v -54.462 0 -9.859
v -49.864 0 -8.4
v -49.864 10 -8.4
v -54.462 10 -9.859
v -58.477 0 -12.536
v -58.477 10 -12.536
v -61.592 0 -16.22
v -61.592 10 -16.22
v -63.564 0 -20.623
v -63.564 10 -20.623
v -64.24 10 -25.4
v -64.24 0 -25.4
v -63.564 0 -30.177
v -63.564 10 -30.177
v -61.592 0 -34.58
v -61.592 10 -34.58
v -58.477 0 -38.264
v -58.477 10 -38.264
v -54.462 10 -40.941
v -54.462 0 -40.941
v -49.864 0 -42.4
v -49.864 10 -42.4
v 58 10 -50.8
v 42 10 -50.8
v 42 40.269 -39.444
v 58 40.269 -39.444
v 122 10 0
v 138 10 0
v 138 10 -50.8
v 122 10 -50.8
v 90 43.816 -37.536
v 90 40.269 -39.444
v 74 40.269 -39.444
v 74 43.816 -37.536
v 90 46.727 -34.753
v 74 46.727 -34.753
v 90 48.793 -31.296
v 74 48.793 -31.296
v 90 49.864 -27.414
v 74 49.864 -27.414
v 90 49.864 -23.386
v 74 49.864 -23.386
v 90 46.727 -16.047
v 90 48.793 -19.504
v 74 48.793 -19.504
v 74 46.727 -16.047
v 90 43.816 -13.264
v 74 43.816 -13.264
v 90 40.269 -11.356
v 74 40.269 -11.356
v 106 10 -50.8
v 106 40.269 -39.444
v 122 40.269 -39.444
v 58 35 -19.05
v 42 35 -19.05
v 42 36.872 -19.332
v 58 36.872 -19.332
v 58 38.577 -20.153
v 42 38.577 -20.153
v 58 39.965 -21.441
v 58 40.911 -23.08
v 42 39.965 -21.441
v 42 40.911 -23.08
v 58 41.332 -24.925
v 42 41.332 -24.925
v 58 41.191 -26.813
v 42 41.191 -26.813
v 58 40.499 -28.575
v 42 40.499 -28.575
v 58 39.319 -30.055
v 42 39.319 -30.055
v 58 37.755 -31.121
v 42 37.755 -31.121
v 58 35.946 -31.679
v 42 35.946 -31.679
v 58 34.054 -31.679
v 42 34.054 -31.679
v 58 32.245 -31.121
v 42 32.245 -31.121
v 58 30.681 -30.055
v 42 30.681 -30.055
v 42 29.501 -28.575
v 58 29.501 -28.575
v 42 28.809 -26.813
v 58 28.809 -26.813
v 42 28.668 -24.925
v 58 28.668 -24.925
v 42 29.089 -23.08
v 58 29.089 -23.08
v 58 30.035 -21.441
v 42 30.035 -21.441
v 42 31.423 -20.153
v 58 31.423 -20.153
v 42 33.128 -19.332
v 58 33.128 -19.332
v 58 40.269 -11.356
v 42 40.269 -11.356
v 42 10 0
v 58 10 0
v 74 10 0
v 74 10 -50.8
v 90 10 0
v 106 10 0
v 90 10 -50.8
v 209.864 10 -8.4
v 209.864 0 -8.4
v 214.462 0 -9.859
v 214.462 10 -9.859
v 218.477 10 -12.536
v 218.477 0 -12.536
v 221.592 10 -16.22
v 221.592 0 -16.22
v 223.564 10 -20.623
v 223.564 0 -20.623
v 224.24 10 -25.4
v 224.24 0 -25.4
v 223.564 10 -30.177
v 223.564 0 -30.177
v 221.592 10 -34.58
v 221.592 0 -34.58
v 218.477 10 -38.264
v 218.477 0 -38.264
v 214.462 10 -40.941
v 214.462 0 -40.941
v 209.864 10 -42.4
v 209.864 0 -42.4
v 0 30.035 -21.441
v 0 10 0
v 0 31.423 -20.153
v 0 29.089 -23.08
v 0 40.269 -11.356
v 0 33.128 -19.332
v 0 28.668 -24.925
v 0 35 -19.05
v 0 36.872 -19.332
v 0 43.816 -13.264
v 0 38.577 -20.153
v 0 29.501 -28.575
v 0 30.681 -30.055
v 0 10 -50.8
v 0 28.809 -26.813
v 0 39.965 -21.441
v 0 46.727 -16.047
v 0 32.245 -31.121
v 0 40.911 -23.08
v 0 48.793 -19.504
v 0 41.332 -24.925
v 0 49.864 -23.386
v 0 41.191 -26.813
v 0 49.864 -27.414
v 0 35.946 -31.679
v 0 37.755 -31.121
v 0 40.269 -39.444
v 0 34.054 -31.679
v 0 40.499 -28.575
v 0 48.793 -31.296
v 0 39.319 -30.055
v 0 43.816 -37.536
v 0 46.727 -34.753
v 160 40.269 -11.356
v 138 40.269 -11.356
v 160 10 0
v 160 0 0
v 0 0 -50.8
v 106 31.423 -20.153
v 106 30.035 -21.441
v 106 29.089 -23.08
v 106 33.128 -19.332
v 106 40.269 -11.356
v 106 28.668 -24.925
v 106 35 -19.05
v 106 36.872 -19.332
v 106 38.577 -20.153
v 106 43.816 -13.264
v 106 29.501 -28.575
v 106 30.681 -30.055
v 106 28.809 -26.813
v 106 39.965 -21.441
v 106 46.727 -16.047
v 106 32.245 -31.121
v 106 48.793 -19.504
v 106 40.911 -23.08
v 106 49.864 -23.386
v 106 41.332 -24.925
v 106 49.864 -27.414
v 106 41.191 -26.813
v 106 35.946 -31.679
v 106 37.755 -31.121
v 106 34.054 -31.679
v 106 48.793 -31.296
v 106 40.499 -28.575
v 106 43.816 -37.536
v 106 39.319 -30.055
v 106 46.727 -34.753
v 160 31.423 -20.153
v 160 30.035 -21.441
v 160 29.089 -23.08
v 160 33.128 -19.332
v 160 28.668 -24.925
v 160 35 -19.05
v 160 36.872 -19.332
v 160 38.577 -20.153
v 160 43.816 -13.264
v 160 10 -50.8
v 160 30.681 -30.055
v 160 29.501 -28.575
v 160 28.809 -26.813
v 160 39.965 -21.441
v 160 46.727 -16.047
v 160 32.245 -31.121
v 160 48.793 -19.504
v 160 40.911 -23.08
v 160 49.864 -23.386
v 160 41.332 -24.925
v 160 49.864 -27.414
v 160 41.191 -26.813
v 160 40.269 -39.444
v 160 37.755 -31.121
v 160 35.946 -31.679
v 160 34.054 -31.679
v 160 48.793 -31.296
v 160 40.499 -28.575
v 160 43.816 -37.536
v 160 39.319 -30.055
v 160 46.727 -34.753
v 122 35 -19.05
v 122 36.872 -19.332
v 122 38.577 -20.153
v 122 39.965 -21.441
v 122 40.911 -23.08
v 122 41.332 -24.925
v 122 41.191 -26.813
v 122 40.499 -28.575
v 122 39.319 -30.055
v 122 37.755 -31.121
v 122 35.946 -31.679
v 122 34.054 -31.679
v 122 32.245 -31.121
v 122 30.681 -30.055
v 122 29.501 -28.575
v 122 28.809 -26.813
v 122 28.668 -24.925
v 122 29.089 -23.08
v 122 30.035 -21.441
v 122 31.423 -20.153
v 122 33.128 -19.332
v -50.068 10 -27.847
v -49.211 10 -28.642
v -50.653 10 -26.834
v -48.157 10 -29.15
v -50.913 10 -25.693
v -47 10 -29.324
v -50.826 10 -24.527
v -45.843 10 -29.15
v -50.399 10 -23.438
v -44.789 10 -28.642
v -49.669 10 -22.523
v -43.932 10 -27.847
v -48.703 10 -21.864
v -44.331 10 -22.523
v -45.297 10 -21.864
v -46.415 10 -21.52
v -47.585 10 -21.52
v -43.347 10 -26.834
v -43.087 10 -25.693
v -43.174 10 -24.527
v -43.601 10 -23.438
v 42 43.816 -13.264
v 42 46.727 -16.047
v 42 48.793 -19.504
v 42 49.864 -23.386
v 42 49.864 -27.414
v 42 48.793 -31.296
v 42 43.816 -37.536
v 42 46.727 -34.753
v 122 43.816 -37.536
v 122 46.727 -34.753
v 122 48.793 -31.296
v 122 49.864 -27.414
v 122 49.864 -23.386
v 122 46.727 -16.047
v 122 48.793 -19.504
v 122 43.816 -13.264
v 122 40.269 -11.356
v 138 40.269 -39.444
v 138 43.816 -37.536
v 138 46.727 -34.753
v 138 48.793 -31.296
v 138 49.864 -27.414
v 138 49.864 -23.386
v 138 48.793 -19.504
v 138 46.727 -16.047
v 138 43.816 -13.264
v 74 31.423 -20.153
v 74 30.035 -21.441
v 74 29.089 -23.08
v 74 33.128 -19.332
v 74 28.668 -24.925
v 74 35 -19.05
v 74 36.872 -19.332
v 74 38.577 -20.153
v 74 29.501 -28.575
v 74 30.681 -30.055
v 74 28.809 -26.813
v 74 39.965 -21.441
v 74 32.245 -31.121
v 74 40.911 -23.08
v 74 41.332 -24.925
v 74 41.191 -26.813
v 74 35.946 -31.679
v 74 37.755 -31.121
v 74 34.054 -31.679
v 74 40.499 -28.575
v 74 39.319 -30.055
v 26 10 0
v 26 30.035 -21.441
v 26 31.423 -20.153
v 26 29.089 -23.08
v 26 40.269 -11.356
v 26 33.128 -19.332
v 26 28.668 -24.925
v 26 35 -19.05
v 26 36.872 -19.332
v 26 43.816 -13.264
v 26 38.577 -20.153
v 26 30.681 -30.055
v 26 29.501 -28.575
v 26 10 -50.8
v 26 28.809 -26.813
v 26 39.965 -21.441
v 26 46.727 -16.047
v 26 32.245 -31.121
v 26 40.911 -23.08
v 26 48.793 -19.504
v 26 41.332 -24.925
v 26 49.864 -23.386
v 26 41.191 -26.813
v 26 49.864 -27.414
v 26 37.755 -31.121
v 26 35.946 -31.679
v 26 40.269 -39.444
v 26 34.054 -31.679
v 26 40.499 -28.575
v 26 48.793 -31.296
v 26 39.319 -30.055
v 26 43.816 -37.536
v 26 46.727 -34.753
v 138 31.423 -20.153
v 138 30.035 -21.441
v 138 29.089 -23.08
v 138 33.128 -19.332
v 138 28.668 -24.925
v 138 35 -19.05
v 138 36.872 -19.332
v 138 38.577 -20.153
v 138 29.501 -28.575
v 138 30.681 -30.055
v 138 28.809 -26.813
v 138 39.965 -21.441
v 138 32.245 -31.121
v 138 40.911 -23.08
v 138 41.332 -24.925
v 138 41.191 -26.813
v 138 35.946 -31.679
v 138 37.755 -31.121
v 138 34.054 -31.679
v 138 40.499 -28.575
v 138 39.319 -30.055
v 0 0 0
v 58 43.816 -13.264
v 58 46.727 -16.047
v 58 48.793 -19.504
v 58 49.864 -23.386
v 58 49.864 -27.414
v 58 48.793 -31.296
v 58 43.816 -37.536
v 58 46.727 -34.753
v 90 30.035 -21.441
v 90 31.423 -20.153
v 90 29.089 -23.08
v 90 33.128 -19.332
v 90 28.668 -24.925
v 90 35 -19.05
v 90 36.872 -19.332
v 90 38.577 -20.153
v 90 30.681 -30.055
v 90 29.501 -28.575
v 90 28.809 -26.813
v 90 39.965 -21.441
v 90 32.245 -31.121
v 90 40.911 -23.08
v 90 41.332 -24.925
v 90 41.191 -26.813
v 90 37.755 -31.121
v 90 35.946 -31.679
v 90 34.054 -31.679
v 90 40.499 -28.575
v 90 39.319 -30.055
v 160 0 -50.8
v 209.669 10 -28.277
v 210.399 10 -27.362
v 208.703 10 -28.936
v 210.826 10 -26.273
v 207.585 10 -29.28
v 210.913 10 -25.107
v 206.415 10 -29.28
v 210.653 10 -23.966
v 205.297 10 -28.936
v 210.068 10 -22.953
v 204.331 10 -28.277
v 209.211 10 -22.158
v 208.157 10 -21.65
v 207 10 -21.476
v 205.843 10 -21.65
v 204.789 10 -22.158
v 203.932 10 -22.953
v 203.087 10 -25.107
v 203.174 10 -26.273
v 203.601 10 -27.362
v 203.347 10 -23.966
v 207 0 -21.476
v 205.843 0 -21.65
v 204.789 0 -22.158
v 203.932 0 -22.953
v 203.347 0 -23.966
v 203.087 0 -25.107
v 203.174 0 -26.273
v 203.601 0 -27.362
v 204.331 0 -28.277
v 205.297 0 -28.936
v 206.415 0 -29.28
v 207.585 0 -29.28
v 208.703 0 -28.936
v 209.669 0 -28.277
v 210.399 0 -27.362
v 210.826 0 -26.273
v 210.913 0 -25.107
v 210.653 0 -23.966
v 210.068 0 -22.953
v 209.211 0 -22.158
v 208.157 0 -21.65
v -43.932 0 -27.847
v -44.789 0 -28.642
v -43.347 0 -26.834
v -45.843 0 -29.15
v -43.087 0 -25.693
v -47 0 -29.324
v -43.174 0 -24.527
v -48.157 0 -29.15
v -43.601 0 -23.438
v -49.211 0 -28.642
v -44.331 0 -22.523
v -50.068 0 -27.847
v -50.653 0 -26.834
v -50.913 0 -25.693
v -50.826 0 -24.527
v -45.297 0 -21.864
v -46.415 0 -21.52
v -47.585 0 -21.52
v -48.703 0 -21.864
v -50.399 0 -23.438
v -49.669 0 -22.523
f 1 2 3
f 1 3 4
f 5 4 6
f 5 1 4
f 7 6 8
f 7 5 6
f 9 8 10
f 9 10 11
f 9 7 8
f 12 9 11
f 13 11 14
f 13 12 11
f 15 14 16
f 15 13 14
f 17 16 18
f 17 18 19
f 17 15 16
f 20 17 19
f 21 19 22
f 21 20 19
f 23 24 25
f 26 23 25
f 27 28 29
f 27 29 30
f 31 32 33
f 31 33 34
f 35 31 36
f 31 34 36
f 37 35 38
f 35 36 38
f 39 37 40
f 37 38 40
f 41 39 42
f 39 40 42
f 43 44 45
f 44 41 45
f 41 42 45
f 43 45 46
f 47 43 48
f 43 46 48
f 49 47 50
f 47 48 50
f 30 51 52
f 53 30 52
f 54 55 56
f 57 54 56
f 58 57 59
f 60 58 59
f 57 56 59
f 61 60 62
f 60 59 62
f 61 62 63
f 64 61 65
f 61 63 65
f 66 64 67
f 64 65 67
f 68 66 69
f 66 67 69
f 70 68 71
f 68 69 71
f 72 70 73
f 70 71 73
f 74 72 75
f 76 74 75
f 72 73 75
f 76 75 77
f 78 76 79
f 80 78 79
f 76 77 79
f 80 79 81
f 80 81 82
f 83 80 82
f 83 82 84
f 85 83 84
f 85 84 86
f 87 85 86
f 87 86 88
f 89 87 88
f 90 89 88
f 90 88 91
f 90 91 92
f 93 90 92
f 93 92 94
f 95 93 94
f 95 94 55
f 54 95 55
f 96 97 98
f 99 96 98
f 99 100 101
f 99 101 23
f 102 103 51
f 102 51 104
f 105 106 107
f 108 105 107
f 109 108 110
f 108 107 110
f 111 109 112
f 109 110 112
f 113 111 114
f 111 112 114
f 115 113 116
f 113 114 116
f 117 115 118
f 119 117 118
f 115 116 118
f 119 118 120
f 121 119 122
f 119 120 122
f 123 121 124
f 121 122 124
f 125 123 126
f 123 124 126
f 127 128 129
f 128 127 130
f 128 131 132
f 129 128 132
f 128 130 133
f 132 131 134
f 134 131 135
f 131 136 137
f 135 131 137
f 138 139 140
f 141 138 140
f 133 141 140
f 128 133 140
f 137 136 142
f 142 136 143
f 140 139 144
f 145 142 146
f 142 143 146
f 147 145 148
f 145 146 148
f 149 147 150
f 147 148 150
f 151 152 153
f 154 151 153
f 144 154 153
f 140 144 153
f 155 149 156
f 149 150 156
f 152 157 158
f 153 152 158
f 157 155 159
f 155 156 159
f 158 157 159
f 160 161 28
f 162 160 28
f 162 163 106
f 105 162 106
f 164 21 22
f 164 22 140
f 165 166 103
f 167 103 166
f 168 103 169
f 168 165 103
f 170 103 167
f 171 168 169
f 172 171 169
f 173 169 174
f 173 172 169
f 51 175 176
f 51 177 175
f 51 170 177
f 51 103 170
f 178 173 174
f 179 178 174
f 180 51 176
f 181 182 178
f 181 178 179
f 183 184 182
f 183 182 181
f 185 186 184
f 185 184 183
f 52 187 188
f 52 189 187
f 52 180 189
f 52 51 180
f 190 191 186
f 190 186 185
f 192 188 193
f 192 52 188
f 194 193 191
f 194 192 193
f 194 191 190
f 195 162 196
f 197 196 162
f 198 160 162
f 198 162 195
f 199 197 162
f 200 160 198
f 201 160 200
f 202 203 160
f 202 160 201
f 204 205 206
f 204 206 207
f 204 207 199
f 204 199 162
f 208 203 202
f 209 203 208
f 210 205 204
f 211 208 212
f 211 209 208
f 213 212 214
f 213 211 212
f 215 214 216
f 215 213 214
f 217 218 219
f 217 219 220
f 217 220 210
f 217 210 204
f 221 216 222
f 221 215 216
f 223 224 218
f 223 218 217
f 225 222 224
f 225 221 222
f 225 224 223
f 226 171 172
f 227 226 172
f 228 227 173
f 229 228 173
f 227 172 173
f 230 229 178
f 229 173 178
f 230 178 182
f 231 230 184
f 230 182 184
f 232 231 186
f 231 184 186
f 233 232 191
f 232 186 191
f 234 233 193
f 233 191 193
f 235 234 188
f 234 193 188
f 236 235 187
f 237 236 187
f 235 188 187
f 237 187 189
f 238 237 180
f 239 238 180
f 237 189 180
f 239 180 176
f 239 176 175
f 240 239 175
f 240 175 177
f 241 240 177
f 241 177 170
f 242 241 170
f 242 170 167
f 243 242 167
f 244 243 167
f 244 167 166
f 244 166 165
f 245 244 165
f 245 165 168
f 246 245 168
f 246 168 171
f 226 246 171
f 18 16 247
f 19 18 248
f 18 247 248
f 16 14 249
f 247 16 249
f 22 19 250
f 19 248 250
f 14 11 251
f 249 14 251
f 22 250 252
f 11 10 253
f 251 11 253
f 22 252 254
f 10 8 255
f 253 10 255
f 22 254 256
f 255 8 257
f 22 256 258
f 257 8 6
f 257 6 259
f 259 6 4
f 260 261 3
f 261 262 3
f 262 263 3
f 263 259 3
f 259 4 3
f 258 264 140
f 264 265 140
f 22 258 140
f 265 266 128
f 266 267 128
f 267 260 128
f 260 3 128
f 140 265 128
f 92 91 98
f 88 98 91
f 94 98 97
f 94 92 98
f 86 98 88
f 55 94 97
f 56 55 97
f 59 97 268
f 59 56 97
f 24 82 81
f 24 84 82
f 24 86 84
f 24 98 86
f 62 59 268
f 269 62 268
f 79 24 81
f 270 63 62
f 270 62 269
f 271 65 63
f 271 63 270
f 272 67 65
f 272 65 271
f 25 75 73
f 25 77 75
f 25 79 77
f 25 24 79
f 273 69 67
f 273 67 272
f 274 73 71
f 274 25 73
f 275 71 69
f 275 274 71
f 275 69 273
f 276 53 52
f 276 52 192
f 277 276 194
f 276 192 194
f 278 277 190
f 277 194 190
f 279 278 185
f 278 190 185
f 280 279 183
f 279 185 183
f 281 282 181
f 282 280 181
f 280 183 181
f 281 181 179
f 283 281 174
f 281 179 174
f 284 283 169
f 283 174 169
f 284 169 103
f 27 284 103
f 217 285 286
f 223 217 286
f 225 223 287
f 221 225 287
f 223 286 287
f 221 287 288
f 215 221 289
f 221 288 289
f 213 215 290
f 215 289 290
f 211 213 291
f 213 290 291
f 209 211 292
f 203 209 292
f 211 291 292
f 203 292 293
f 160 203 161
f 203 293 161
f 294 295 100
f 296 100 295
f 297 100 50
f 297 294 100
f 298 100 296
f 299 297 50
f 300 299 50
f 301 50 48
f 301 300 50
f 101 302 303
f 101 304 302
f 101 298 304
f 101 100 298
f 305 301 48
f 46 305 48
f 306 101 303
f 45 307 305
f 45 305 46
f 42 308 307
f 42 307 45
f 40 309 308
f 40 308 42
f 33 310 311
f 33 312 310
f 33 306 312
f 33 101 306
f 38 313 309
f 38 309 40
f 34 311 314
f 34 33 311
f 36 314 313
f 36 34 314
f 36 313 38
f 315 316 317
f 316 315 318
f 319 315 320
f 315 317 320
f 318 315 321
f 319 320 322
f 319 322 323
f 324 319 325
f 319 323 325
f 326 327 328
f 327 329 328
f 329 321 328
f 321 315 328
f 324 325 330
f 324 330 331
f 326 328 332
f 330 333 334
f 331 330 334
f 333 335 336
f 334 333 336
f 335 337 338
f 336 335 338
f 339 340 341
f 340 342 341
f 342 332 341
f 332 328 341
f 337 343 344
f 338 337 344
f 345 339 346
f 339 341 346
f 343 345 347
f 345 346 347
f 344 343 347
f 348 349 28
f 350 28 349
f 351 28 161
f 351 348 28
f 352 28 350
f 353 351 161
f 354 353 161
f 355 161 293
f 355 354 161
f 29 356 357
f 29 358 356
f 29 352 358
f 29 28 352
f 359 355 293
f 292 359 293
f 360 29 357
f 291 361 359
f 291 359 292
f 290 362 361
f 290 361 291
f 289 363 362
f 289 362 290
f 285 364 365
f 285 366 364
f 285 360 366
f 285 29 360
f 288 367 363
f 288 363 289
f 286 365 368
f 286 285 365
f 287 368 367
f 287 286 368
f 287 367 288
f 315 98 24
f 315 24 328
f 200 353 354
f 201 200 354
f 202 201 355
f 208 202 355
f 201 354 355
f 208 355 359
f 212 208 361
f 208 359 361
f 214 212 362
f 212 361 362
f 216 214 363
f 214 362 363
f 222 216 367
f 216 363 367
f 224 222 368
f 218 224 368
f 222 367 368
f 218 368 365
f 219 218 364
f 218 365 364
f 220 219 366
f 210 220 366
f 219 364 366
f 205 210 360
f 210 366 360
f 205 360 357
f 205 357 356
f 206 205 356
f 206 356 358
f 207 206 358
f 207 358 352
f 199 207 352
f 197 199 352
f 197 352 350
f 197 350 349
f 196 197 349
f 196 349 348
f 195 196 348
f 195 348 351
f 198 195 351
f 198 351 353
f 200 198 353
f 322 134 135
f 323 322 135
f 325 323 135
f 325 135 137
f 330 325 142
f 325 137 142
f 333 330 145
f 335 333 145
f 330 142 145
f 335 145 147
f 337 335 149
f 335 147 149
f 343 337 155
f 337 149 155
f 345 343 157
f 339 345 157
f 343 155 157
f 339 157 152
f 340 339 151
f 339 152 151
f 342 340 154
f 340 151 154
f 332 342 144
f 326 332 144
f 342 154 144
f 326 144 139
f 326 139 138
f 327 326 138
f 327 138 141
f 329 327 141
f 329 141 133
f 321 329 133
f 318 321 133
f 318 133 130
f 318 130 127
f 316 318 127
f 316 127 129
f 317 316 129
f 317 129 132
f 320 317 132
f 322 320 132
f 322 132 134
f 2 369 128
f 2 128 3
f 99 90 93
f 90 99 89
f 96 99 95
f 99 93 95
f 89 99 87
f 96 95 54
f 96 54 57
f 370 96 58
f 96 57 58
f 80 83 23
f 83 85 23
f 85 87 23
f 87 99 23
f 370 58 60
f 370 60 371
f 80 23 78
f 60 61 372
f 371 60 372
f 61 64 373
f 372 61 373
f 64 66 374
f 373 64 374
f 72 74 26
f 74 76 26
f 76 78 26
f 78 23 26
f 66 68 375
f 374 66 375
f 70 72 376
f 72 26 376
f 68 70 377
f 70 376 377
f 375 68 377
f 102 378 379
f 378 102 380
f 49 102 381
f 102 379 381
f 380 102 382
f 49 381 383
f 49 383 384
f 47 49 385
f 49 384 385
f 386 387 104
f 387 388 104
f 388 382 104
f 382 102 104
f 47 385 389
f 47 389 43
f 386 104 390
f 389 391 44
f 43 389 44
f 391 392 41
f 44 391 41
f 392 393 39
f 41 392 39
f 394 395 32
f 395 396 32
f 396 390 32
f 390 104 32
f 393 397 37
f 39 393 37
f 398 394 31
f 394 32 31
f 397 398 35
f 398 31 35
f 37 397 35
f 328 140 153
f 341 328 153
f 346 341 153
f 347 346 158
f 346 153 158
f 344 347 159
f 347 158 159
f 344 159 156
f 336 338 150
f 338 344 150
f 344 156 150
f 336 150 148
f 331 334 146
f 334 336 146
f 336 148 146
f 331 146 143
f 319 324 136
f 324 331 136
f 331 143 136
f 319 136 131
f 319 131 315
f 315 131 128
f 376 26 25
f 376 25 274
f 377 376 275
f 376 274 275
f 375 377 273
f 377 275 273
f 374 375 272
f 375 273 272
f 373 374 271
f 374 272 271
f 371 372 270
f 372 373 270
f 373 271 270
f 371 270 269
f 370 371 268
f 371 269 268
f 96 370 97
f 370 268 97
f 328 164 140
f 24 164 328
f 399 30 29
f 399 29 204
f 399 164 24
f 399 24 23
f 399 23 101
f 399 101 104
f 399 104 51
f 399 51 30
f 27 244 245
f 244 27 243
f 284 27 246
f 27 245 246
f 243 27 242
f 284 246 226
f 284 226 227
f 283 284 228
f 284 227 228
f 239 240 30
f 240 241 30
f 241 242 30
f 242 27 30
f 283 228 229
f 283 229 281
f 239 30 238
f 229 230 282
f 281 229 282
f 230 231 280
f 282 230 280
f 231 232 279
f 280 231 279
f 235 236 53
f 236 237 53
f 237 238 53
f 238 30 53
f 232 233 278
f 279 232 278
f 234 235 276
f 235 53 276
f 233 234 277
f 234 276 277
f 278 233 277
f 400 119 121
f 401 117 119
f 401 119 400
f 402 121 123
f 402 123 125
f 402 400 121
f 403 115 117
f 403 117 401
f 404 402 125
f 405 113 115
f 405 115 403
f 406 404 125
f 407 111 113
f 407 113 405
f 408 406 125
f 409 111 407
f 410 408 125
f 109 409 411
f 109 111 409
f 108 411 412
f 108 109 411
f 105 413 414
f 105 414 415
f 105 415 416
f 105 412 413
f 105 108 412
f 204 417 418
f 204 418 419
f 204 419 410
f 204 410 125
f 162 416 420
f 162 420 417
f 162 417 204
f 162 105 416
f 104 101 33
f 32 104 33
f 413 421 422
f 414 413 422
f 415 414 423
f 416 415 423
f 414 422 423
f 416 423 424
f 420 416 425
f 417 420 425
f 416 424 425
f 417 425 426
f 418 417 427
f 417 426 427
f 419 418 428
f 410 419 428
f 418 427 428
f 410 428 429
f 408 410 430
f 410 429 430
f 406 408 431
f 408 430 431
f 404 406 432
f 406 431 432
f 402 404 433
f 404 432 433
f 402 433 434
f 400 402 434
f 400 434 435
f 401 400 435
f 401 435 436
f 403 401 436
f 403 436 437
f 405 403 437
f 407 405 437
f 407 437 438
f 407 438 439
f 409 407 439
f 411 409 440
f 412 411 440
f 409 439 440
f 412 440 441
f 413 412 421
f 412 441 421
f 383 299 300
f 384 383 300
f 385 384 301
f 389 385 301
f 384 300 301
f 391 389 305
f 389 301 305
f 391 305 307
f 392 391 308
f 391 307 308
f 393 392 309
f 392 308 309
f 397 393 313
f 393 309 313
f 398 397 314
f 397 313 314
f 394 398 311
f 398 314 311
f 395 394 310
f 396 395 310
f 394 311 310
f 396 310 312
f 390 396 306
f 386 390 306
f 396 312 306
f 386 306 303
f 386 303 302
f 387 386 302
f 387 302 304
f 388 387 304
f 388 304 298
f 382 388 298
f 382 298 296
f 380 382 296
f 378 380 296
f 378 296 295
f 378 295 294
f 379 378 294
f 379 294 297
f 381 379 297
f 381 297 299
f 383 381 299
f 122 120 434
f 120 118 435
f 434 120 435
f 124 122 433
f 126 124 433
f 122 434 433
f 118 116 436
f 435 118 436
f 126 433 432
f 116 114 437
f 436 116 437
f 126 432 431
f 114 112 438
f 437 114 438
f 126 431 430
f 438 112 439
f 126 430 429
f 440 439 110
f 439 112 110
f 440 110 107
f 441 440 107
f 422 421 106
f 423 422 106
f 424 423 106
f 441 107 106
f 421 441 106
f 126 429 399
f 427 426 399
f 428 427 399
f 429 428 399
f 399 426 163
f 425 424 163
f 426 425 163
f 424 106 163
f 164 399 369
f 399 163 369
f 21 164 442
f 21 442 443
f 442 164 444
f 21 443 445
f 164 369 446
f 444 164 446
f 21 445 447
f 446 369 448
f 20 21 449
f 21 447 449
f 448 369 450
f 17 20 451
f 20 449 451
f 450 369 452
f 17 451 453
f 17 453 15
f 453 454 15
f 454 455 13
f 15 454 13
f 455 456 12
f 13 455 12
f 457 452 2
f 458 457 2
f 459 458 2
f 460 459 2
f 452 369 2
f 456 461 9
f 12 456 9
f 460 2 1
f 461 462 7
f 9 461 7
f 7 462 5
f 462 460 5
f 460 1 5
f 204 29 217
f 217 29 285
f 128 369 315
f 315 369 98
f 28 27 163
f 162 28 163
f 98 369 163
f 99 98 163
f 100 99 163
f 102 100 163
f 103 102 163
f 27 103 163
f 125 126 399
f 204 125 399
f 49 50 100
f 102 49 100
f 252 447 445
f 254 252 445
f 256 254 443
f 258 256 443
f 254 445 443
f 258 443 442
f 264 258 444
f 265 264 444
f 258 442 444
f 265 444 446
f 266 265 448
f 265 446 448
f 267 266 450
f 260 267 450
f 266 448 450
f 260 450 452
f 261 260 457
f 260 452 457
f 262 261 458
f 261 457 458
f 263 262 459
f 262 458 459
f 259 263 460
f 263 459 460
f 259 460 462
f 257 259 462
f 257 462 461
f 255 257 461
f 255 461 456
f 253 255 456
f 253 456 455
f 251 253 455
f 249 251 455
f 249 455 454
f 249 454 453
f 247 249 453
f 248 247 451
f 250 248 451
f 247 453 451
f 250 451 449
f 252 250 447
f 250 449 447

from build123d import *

# Parameters (mm, degrees)
SKETCH1_W           = 160
SKETCH1_H           = 50.8
BOSS_EXTRUDE1_DEPTH = 10
SKETCH2_R           = 6.35
BOSS_EXTRUDE2_DEPTH = 160
SKETCH3_W           = 16
SKETCH3_H           = 40
CUT_EXTRUDE1_DEPTH  = 71
SKETCH5_R           = 3.9243
BOSS_EXTRUDE3_DEPTH = 10


with BuildPart() as part:
    # Sketch1 → Boss-Extrude1 (new body)
    with BuildSketch(Plane(origin=(0, 0, 0), x_dir=(1, 0, 0), z_dir=(0, 1, 0))):
        with Locations((80, 25.4)):
            Rectangle(SKETCH1_W, SKETCH1_H)
    extrude(amount=BOSS_EXTRUDE1_DEPTH)

    # Sketch2 → Boss-Extrude2 (add, through all)
    with BuildSketch(Plane.ZY):
        with BuildLine():
            Line((-50.8, 10), (-39.444175854, 40.268882668))
            ThreePointArc((-39.444175854, 40.268882668), (-25.4, 50), (-11.355824146, 40.268882668))
            Line((-11.355824146, 40.268882668), (0, 10))
            Line((0, 10), (-50.8, 10))
        make_face()
        with Locations((-25.4, 35)):
            Circle(SKETCH2_R, mode=Mode.SUBTRACT)
    extrude(amount=-BOSS_EXTRUDE2_DEPTH)

    # Sketch3 → Cut-Extrude1 (cut)
    with BuildSketch(Plane(origin=(0, 0, -50.8), x_dir=(-1, 0, 0), z_dir=(0, 0, -1))):
        with Locations((-130, 30)):
            Rectangle(SKETCH3_W, SKETCH3_H)
        with Locations((-98, 30)):
            Rectangle(SKETCH3_W, SKETCH3_H)
        with Locations((-66, 30)):
            Rectangle(SKETCH3_W, SKETCH3_H)
        with Locations((-34, 30)):
            Rectangle(SKETCH3_W, SKETCH3_H)
    extrude(amount=-CUT_EXTRUDE1_DEPTH, mode=Mode.SUBTRACT)

    # Sketch5 → Boss-Extrude3 (add)
    # profile 1 of 2: a face of its own
    with BuildSketch(Plane.XZ):
        with BuildLine():
            Line((160, 0), (209.86380094, -8.4))
            ThreePointArc((209.86380094, -8.4), (224.239528875, -25.4), (209.86380094, -42.4))
            Line((209.86380094, -42.4), (160, -50.8))
            Line((160, -50.8), (160, 0))
        make_face()
        with Locations(Location((207, -25.4, 0), (0, 0, 90))):
            Circle(SKETCH5_R, mode=Mode.SUBTRACT)
    # profile 2 of 2: a face of its own
    with BuildSketch(Plane.XZ):
        with BuildLine():
            Line((0, 0), (-49.86380094, -8.4))
            ThreePointArc((-49.86380094, -8.4), (-64.239528875, -25.4), (-49.86380094, -42.4))
            Line((-49.86380094, -42.4), (0, -50.8))
            Line((0, -50.8), (0, 0))
        make_face()
        with Locations(Location((-47, -25.4, 0), (0, 0, 270))):
            Circle(SKETCH5_R, mode=Mode.SUBTRACT)
    extrude(amount=-BOSS_EXTRUDE3_DEPTH)


solid = part.part
